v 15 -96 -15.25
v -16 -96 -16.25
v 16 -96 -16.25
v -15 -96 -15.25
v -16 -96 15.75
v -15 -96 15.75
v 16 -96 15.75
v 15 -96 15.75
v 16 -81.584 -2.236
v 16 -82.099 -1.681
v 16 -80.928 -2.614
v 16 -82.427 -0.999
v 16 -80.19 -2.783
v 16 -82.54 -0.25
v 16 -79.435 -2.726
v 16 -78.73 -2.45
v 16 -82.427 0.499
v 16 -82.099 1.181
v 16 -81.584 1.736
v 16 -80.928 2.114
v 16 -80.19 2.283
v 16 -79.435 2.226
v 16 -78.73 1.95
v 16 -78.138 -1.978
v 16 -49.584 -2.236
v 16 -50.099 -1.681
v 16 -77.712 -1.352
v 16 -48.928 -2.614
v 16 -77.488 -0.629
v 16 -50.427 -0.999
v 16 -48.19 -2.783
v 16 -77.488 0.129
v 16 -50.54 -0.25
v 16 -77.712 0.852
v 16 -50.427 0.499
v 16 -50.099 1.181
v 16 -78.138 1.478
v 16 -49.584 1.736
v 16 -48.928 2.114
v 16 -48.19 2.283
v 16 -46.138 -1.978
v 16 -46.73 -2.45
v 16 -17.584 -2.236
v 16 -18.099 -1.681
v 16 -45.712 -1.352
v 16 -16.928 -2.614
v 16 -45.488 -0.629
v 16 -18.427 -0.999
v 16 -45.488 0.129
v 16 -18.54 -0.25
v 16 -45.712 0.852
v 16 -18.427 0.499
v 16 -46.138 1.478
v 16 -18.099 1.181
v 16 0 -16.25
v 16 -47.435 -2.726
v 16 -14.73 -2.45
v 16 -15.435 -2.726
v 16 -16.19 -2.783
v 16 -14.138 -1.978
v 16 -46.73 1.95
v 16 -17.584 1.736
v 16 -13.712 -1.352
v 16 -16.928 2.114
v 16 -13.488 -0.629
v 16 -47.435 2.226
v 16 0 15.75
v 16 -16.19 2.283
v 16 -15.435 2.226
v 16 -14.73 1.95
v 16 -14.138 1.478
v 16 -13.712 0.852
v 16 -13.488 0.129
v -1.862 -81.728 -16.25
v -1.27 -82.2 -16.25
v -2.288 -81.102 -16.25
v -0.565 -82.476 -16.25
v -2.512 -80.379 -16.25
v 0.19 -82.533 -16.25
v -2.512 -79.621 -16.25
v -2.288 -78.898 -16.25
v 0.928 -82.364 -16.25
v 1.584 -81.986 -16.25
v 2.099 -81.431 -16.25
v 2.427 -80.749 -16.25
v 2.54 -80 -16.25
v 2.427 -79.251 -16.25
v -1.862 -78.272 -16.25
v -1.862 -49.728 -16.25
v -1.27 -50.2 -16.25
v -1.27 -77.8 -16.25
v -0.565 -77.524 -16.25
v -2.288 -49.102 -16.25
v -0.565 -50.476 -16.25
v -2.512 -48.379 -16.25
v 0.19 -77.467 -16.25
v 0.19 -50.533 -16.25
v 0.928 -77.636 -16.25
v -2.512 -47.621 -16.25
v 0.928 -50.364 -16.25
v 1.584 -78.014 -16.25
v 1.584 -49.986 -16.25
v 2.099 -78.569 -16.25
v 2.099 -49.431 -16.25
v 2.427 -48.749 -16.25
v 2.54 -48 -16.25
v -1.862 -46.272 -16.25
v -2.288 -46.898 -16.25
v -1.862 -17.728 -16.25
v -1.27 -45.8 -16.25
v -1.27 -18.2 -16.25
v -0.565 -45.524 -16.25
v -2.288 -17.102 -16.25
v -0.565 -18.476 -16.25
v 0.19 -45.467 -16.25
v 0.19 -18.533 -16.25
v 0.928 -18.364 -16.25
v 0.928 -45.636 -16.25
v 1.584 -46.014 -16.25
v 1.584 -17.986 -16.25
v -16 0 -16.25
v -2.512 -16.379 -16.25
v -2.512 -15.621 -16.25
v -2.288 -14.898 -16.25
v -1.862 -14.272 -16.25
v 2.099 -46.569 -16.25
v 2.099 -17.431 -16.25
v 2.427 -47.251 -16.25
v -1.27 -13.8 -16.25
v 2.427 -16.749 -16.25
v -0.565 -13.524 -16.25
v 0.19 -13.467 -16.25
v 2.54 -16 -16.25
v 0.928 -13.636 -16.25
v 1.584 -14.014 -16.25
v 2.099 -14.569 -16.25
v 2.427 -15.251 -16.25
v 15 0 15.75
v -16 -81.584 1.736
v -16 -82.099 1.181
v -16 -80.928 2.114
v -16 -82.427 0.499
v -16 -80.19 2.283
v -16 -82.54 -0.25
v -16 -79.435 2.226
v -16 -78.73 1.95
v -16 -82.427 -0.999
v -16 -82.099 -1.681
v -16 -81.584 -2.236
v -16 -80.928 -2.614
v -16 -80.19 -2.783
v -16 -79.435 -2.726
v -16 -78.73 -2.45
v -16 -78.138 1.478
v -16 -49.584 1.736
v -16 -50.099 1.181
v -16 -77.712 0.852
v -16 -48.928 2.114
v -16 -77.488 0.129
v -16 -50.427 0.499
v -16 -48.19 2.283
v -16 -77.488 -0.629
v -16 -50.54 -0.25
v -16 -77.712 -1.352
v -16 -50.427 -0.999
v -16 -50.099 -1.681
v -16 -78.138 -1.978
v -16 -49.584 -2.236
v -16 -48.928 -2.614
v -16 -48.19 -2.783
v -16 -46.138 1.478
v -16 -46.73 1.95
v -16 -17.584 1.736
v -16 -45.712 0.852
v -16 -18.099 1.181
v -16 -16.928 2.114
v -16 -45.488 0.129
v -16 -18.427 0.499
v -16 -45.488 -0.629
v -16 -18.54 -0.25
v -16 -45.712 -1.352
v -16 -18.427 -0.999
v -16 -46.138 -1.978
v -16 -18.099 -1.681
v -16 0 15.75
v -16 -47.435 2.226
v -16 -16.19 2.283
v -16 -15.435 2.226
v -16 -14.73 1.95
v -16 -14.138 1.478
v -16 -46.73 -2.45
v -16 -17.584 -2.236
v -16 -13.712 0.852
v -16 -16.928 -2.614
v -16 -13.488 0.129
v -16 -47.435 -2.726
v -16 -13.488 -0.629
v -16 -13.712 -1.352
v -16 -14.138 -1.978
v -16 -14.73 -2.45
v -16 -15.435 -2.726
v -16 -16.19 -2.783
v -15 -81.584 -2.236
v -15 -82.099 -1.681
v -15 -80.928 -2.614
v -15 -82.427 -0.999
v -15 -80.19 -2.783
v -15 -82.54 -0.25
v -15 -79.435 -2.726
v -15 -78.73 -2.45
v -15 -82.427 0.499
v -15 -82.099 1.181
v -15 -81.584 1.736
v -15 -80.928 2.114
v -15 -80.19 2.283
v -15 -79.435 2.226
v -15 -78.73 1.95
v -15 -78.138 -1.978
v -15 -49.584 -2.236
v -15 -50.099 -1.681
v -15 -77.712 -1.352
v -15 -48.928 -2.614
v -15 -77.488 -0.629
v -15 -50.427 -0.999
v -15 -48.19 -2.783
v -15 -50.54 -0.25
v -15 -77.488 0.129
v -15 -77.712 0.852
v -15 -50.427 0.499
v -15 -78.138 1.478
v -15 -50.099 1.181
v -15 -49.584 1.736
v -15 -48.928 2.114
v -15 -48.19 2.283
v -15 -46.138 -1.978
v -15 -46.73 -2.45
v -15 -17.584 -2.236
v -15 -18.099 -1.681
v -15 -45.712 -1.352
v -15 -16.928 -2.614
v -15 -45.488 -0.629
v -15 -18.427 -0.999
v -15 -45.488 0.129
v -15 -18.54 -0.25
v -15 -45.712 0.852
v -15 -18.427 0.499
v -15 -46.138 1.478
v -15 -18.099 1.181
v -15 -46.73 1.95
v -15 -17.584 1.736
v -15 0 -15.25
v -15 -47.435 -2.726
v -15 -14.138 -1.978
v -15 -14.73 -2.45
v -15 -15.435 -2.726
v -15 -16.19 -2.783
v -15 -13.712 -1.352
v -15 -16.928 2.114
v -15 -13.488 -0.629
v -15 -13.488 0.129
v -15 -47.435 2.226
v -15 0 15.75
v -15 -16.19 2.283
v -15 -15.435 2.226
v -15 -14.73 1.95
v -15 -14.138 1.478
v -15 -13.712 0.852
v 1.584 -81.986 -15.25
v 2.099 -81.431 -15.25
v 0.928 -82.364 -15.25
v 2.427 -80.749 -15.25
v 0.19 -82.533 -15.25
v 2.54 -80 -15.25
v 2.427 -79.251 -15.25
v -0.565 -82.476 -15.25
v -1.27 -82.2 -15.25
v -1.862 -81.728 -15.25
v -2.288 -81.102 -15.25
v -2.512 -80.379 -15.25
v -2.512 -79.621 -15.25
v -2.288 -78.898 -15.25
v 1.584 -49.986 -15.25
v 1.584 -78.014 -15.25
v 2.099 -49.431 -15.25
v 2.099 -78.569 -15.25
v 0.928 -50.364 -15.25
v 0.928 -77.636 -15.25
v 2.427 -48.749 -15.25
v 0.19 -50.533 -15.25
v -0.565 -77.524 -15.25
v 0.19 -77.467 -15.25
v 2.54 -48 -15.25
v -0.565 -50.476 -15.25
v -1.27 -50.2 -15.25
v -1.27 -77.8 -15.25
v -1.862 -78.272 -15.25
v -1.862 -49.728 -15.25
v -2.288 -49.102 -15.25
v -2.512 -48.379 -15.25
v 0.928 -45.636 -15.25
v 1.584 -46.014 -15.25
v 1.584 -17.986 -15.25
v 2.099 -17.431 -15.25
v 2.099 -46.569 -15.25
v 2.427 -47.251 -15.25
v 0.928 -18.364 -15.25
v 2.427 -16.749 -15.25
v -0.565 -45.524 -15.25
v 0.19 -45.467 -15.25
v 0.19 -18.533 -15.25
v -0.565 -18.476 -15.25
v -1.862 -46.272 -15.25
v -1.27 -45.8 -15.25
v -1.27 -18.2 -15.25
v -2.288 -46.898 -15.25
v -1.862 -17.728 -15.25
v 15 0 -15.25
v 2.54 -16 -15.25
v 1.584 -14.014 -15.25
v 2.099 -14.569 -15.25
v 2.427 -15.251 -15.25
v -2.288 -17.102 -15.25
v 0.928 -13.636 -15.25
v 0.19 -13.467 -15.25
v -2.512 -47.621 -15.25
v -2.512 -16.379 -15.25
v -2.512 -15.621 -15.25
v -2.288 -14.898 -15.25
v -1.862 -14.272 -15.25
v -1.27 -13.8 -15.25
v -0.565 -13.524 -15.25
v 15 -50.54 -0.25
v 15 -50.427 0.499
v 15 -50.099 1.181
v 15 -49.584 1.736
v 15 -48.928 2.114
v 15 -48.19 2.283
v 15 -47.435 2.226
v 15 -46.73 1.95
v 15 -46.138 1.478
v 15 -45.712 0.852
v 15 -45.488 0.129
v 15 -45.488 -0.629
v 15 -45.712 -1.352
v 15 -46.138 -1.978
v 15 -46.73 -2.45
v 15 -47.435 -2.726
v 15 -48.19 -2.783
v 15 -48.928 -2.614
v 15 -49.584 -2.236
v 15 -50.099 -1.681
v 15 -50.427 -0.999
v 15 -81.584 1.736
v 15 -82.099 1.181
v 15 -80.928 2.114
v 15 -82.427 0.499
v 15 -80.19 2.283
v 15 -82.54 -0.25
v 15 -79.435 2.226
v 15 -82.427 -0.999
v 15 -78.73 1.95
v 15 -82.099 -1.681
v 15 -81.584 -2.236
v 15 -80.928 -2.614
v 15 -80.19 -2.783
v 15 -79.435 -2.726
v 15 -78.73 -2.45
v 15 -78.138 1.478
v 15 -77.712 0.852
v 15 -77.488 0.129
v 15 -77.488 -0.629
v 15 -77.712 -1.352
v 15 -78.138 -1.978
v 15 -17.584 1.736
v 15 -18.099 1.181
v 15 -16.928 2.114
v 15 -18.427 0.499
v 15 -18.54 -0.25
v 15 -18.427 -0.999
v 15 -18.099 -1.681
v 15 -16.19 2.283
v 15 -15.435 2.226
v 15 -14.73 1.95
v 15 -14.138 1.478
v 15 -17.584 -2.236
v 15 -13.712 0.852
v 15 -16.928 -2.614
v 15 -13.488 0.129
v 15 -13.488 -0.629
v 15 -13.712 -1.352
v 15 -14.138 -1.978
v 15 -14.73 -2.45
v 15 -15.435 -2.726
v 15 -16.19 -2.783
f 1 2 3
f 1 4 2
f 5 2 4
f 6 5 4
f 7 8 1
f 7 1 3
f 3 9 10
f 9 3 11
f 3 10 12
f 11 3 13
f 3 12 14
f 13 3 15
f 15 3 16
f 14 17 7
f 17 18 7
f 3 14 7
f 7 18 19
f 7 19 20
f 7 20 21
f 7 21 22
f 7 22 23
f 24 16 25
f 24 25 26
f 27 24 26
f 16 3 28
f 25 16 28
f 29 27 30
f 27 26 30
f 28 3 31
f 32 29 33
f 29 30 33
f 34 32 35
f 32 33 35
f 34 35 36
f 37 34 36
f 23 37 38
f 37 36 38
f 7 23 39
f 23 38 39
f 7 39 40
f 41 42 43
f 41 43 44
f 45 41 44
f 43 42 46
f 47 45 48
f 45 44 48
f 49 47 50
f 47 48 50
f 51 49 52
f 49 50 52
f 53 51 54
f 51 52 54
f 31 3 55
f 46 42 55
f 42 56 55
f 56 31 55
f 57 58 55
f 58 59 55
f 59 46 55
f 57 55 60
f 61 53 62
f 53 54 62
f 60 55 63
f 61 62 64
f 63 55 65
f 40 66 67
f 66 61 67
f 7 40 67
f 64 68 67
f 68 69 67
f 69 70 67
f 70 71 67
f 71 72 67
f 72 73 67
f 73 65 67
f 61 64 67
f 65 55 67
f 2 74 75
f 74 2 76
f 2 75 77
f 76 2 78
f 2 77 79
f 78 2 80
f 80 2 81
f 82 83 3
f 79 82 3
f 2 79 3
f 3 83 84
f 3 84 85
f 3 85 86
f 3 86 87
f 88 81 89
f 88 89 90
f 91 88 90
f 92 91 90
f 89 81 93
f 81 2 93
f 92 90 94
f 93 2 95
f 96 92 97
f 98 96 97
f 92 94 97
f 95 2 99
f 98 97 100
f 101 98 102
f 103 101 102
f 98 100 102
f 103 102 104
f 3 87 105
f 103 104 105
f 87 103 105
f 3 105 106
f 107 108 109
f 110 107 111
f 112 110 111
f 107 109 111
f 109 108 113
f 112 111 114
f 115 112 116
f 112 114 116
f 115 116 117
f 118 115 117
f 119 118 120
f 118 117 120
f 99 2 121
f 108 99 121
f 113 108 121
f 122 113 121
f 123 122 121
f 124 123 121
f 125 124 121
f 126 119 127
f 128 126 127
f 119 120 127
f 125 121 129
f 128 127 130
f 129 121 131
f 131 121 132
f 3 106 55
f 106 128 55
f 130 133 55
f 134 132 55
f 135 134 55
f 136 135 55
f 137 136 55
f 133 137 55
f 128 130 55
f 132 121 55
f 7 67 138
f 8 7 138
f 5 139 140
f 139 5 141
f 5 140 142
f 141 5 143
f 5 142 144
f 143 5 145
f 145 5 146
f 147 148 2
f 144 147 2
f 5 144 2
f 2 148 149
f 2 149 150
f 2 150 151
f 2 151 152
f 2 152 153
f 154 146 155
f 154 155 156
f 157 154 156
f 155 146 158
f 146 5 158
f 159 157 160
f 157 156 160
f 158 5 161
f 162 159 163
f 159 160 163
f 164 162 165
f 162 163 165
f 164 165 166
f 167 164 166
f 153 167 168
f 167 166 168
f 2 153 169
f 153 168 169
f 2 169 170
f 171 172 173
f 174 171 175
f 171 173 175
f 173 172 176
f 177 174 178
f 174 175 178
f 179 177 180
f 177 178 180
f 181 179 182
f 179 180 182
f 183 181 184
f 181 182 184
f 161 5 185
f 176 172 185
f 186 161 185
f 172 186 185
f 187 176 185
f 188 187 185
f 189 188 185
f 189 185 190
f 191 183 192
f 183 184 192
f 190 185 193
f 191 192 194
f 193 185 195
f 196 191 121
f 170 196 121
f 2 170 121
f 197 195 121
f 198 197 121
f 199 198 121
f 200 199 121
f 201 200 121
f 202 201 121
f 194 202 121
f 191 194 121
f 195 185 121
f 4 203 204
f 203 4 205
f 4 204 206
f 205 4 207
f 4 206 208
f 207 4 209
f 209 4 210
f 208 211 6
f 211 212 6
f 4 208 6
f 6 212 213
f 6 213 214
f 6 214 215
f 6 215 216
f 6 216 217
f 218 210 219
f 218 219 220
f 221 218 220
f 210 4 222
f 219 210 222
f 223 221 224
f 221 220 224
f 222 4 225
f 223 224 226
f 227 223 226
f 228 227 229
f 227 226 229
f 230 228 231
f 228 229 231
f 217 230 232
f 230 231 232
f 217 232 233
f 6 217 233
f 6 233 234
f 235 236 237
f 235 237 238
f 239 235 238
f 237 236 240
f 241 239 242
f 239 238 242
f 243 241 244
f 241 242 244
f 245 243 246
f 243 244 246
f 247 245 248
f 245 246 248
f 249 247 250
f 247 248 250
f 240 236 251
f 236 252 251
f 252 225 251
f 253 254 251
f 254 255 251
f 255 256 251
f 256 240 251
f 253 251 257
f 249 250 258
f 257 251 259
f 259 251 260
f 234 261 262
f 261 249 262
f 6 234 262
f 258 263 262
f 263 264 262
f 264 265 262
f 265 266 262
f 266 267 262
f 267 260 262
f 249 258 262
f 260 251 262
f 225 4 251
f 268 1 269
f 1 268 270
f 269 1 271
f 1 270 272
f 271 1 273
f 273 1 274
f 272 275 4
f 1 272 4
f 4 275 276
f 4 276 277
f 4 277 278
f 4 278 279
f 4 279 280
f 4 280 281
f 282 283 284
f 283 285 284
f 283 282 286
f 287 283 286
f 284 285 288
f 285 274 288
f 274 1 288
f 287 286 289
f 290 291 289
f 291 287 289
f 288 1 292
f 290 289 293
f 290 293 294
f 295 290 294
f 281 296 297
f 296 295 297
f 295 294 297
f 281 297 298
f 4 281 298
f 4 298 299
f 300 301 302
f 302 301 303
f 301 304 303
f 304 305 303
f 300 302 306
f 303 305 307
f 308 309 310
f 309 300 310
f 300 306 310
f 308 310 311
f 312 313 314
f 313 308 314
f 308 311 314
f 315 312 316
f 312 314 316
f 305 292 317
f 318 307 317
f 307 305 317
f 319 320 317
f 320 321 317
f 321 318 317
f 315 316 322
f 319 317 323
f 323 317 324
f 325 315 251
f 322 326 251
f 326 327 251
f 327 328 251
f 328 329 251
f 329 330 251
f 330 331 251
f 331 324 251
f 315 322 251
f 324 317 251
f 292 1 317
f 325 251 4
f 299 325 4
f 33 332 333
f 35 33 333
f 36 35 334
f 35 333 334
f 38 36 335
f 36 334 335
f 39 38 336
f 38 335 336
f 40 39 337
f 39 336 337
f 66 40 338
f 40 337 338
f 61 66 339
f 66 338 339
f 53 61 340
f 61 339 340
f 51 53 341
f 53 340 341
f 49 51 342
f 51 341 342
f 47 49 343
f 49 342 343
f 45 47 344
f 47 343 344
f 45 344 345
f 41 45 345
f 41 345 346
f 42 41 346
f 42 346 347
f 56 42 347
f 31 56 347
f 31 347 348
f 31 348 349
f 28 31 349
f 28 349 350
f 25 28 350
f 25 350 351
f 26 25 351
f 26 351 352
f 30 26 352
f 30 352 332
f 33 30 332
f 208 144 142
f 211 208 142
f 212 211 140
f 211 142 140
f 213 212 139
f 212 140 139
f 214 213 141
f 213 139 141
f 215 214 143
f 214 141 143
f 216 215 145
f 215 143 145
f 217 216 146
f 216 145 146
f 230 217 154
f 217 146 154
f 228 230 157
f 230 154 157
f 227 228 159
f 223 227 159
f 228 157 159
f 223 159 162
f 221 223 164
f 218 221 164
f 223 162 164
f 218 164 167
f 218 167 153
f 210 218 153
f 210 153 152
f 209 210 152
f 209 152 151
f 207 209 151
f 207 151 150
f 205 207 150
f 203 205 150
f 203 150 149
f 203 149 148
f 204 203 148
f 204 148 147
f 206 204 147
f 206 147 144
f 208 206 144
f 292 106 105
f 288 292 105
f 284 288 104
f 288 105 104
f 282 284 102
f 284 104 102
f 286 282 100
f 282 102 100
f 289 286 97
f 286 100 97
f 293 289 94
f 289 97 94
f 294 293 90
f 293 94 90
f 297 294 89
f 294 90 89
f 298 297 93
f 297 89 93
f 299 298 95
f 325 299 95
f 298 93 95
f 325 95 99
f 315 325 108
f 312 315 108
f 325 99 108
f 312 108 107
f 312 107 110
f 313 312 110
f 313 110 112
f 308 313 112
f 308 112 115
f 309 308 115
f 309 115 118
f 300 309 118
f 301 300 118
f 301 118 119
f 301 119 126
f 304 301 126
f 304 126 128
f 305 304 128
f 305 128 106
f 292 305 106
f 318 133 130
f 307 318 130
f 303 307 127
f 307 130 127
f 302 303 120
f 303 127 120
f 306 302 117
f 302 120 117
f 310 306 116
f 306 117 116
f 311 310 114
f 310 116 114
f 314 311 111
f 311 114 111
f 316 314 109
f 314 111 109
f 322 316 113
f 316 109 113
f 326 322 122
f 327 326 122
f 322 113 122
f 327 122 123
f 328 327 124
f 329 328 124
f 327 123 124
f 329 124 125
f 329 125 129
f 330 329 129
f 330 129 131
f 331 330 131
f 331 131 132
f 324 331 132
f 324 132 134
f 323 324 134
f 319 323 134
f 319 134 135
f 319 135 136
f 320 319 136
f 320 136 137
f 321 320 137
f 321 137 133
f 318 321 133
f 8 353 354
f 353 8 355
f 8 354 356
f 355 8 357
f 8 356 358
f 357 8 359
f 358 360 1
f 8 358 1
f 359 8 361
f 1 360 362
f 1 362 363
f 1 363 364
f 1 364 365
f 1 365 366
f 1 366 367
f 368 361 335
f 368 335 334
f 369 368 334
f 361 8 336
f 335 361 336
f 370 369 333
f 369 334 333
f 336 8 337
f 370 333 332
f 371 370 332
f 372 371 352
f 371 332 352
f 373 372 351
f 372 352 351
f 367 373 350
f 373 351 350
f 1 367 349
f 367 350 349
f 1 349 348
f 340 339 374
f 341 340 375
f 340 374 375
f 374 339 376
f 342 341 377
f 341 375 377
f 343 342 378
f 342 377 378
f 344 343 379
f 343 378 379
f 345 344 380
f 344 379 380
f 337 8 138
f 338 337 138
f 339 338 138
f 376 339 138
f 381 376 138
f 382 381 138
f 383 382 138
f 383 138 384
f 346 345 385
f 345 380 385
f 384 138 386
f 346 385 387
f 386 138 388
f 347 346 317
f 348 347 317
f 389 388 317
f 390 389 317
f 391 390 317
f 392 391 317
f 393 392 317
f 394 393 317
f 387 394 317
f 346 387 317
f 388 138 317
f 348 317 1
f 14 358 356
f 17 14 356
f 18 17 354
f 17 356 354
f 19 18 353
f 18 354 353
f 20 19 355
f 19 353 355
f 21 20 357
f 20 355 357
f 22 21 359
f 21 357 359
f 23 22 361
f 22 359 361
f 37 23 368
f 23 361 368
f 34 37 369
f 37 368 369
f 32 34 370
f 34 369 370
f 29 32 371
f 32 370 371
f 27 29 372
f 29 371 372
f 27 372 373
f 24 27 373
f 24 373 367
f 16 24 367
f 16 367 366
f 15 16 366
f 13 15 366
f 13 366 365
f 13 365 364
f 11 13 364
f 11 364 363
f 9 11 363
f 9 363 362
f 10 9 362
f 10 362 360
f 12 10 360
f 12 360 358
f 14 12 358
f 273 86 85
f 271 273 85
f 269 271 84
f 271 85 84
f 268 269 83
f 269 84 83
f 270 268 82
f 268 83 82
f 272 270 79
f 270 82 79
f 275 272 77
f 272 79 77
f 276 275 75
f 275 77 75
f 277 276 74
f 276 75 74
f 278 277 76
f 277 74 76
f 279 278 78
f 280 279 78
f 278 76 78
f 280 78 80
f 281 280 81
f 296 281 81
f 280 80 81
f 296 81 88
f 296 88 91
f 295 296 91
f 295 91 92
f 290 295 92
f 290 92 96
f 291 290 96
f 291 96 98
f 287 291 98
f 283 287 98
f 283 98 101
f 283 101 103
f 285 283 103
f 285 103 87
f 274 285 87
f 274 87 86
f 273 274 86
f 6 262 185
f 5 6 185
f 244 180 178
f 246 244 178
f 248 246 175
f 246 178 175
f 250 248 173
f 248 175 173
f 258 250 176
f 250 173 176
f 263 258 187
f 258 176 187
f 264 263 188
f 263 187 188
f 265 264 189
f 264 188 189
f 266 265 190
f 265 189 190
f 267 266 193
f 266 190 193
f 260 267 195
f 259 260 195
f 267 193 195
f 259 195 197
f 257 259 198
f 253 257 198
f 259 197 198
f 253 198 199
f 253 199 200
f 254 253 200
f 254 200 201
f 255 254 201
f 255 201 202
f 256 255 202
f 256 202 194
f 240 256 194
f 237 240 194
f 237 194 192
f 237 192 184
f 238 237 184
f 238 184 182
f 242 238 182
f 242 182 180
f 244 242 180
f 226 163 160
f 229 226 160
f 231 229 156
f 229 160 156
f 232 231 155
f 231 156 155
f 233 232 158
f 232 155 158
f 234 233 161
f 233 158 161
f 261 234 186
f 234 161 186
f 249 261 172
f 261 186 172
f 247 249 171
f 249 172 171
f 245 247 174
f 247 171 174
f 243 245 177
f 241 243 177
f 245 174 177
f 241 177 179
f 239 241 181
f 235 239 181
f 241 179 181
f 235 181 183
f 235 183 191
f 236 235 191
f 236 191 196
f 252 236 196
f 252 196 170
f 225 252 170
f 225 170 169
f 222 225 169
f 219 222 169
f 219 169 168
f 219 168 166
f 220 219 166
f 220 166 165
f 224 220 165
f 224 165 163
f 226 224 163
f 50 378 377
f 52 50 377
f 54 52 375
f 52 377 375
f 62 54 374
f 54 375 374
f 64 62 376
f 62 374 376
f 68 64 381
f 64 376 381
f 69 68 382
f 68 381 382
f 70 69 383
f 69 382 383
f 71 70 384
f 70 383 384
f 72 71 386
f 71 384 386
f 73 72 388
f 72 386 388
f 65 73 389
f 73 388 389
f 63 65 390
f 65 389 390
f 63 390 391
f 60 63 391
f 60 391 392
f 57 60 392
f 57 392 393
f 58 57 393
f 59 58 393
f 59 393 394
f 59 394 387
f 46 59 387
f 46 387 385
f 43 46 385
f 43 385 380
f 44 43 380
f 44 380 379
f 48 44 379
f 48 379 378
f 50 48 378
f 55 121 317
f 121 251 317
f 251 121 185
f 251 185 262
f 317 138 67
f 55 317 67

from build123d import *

# Parameters (mm, degrees)
F1_DEPTH = 96
F2_R     = 2.54
F3_DEPTH = 50.8
F4_R     = 2.54
F5_DEPTH = 50.8
F6_R     = 2.54
F7_DEPTH = 25.4


with BuildPart() as f1:
    # F0 (on Front) → F1 (new body)
    with BuildSketch(Plane.XZ):
        Polygon((-15, 15.75), (-16, 15.75), (-16, -16.25), (16, -16.25), (16, 15.75), (15, 15.75), (15, -15.25), (-15, -15.25), align=None)
    extrude(amount=F1_DEPTH)

    # F2 (on face) → F3 (cut)
    with BuildSketch(Plane(origin=(-16, 0, 0), x_dir=(0, -1, 0), z_dir=(-1, 0, 0))):
        with Locations((16, -0.25)):
            Circle(F2_R)
    extrude(amount=-F3_DEPTH, mode=Mode.SUBTRACT)

    # F4 (on face) → F5 (cut)
    with BuildSketch(Plane(origin=(-16, 0, 0), x_dir=(0, -1, 0), z_dir=(-1, 0, 0))):
        with Locations((48, -0.25)):
            Circle(F4_R)
        with Locations((80, -0.25)):
            Circle(F4_R)
    extrude(amount=-F5_DEPTH, mode=Mode.SUBTRACT)

    # F6 (on face) → F7 (cut)
    with BuildSketch(Plane(origin=(0, 0, -16.25), x_dir=(1, 0, 0), z_dir=(0, 0, -1))):
        with Locations((0, 80)):
            Circle(F6_R)
        with Locations((0, 48)):
            Circle(F6_R)
        with Locations((0, 16)):
            Circle(F6_R)
    extrude(amount=-F7_DEPTH, mode=Mode.SUBTRACT)


solid = f1.part
